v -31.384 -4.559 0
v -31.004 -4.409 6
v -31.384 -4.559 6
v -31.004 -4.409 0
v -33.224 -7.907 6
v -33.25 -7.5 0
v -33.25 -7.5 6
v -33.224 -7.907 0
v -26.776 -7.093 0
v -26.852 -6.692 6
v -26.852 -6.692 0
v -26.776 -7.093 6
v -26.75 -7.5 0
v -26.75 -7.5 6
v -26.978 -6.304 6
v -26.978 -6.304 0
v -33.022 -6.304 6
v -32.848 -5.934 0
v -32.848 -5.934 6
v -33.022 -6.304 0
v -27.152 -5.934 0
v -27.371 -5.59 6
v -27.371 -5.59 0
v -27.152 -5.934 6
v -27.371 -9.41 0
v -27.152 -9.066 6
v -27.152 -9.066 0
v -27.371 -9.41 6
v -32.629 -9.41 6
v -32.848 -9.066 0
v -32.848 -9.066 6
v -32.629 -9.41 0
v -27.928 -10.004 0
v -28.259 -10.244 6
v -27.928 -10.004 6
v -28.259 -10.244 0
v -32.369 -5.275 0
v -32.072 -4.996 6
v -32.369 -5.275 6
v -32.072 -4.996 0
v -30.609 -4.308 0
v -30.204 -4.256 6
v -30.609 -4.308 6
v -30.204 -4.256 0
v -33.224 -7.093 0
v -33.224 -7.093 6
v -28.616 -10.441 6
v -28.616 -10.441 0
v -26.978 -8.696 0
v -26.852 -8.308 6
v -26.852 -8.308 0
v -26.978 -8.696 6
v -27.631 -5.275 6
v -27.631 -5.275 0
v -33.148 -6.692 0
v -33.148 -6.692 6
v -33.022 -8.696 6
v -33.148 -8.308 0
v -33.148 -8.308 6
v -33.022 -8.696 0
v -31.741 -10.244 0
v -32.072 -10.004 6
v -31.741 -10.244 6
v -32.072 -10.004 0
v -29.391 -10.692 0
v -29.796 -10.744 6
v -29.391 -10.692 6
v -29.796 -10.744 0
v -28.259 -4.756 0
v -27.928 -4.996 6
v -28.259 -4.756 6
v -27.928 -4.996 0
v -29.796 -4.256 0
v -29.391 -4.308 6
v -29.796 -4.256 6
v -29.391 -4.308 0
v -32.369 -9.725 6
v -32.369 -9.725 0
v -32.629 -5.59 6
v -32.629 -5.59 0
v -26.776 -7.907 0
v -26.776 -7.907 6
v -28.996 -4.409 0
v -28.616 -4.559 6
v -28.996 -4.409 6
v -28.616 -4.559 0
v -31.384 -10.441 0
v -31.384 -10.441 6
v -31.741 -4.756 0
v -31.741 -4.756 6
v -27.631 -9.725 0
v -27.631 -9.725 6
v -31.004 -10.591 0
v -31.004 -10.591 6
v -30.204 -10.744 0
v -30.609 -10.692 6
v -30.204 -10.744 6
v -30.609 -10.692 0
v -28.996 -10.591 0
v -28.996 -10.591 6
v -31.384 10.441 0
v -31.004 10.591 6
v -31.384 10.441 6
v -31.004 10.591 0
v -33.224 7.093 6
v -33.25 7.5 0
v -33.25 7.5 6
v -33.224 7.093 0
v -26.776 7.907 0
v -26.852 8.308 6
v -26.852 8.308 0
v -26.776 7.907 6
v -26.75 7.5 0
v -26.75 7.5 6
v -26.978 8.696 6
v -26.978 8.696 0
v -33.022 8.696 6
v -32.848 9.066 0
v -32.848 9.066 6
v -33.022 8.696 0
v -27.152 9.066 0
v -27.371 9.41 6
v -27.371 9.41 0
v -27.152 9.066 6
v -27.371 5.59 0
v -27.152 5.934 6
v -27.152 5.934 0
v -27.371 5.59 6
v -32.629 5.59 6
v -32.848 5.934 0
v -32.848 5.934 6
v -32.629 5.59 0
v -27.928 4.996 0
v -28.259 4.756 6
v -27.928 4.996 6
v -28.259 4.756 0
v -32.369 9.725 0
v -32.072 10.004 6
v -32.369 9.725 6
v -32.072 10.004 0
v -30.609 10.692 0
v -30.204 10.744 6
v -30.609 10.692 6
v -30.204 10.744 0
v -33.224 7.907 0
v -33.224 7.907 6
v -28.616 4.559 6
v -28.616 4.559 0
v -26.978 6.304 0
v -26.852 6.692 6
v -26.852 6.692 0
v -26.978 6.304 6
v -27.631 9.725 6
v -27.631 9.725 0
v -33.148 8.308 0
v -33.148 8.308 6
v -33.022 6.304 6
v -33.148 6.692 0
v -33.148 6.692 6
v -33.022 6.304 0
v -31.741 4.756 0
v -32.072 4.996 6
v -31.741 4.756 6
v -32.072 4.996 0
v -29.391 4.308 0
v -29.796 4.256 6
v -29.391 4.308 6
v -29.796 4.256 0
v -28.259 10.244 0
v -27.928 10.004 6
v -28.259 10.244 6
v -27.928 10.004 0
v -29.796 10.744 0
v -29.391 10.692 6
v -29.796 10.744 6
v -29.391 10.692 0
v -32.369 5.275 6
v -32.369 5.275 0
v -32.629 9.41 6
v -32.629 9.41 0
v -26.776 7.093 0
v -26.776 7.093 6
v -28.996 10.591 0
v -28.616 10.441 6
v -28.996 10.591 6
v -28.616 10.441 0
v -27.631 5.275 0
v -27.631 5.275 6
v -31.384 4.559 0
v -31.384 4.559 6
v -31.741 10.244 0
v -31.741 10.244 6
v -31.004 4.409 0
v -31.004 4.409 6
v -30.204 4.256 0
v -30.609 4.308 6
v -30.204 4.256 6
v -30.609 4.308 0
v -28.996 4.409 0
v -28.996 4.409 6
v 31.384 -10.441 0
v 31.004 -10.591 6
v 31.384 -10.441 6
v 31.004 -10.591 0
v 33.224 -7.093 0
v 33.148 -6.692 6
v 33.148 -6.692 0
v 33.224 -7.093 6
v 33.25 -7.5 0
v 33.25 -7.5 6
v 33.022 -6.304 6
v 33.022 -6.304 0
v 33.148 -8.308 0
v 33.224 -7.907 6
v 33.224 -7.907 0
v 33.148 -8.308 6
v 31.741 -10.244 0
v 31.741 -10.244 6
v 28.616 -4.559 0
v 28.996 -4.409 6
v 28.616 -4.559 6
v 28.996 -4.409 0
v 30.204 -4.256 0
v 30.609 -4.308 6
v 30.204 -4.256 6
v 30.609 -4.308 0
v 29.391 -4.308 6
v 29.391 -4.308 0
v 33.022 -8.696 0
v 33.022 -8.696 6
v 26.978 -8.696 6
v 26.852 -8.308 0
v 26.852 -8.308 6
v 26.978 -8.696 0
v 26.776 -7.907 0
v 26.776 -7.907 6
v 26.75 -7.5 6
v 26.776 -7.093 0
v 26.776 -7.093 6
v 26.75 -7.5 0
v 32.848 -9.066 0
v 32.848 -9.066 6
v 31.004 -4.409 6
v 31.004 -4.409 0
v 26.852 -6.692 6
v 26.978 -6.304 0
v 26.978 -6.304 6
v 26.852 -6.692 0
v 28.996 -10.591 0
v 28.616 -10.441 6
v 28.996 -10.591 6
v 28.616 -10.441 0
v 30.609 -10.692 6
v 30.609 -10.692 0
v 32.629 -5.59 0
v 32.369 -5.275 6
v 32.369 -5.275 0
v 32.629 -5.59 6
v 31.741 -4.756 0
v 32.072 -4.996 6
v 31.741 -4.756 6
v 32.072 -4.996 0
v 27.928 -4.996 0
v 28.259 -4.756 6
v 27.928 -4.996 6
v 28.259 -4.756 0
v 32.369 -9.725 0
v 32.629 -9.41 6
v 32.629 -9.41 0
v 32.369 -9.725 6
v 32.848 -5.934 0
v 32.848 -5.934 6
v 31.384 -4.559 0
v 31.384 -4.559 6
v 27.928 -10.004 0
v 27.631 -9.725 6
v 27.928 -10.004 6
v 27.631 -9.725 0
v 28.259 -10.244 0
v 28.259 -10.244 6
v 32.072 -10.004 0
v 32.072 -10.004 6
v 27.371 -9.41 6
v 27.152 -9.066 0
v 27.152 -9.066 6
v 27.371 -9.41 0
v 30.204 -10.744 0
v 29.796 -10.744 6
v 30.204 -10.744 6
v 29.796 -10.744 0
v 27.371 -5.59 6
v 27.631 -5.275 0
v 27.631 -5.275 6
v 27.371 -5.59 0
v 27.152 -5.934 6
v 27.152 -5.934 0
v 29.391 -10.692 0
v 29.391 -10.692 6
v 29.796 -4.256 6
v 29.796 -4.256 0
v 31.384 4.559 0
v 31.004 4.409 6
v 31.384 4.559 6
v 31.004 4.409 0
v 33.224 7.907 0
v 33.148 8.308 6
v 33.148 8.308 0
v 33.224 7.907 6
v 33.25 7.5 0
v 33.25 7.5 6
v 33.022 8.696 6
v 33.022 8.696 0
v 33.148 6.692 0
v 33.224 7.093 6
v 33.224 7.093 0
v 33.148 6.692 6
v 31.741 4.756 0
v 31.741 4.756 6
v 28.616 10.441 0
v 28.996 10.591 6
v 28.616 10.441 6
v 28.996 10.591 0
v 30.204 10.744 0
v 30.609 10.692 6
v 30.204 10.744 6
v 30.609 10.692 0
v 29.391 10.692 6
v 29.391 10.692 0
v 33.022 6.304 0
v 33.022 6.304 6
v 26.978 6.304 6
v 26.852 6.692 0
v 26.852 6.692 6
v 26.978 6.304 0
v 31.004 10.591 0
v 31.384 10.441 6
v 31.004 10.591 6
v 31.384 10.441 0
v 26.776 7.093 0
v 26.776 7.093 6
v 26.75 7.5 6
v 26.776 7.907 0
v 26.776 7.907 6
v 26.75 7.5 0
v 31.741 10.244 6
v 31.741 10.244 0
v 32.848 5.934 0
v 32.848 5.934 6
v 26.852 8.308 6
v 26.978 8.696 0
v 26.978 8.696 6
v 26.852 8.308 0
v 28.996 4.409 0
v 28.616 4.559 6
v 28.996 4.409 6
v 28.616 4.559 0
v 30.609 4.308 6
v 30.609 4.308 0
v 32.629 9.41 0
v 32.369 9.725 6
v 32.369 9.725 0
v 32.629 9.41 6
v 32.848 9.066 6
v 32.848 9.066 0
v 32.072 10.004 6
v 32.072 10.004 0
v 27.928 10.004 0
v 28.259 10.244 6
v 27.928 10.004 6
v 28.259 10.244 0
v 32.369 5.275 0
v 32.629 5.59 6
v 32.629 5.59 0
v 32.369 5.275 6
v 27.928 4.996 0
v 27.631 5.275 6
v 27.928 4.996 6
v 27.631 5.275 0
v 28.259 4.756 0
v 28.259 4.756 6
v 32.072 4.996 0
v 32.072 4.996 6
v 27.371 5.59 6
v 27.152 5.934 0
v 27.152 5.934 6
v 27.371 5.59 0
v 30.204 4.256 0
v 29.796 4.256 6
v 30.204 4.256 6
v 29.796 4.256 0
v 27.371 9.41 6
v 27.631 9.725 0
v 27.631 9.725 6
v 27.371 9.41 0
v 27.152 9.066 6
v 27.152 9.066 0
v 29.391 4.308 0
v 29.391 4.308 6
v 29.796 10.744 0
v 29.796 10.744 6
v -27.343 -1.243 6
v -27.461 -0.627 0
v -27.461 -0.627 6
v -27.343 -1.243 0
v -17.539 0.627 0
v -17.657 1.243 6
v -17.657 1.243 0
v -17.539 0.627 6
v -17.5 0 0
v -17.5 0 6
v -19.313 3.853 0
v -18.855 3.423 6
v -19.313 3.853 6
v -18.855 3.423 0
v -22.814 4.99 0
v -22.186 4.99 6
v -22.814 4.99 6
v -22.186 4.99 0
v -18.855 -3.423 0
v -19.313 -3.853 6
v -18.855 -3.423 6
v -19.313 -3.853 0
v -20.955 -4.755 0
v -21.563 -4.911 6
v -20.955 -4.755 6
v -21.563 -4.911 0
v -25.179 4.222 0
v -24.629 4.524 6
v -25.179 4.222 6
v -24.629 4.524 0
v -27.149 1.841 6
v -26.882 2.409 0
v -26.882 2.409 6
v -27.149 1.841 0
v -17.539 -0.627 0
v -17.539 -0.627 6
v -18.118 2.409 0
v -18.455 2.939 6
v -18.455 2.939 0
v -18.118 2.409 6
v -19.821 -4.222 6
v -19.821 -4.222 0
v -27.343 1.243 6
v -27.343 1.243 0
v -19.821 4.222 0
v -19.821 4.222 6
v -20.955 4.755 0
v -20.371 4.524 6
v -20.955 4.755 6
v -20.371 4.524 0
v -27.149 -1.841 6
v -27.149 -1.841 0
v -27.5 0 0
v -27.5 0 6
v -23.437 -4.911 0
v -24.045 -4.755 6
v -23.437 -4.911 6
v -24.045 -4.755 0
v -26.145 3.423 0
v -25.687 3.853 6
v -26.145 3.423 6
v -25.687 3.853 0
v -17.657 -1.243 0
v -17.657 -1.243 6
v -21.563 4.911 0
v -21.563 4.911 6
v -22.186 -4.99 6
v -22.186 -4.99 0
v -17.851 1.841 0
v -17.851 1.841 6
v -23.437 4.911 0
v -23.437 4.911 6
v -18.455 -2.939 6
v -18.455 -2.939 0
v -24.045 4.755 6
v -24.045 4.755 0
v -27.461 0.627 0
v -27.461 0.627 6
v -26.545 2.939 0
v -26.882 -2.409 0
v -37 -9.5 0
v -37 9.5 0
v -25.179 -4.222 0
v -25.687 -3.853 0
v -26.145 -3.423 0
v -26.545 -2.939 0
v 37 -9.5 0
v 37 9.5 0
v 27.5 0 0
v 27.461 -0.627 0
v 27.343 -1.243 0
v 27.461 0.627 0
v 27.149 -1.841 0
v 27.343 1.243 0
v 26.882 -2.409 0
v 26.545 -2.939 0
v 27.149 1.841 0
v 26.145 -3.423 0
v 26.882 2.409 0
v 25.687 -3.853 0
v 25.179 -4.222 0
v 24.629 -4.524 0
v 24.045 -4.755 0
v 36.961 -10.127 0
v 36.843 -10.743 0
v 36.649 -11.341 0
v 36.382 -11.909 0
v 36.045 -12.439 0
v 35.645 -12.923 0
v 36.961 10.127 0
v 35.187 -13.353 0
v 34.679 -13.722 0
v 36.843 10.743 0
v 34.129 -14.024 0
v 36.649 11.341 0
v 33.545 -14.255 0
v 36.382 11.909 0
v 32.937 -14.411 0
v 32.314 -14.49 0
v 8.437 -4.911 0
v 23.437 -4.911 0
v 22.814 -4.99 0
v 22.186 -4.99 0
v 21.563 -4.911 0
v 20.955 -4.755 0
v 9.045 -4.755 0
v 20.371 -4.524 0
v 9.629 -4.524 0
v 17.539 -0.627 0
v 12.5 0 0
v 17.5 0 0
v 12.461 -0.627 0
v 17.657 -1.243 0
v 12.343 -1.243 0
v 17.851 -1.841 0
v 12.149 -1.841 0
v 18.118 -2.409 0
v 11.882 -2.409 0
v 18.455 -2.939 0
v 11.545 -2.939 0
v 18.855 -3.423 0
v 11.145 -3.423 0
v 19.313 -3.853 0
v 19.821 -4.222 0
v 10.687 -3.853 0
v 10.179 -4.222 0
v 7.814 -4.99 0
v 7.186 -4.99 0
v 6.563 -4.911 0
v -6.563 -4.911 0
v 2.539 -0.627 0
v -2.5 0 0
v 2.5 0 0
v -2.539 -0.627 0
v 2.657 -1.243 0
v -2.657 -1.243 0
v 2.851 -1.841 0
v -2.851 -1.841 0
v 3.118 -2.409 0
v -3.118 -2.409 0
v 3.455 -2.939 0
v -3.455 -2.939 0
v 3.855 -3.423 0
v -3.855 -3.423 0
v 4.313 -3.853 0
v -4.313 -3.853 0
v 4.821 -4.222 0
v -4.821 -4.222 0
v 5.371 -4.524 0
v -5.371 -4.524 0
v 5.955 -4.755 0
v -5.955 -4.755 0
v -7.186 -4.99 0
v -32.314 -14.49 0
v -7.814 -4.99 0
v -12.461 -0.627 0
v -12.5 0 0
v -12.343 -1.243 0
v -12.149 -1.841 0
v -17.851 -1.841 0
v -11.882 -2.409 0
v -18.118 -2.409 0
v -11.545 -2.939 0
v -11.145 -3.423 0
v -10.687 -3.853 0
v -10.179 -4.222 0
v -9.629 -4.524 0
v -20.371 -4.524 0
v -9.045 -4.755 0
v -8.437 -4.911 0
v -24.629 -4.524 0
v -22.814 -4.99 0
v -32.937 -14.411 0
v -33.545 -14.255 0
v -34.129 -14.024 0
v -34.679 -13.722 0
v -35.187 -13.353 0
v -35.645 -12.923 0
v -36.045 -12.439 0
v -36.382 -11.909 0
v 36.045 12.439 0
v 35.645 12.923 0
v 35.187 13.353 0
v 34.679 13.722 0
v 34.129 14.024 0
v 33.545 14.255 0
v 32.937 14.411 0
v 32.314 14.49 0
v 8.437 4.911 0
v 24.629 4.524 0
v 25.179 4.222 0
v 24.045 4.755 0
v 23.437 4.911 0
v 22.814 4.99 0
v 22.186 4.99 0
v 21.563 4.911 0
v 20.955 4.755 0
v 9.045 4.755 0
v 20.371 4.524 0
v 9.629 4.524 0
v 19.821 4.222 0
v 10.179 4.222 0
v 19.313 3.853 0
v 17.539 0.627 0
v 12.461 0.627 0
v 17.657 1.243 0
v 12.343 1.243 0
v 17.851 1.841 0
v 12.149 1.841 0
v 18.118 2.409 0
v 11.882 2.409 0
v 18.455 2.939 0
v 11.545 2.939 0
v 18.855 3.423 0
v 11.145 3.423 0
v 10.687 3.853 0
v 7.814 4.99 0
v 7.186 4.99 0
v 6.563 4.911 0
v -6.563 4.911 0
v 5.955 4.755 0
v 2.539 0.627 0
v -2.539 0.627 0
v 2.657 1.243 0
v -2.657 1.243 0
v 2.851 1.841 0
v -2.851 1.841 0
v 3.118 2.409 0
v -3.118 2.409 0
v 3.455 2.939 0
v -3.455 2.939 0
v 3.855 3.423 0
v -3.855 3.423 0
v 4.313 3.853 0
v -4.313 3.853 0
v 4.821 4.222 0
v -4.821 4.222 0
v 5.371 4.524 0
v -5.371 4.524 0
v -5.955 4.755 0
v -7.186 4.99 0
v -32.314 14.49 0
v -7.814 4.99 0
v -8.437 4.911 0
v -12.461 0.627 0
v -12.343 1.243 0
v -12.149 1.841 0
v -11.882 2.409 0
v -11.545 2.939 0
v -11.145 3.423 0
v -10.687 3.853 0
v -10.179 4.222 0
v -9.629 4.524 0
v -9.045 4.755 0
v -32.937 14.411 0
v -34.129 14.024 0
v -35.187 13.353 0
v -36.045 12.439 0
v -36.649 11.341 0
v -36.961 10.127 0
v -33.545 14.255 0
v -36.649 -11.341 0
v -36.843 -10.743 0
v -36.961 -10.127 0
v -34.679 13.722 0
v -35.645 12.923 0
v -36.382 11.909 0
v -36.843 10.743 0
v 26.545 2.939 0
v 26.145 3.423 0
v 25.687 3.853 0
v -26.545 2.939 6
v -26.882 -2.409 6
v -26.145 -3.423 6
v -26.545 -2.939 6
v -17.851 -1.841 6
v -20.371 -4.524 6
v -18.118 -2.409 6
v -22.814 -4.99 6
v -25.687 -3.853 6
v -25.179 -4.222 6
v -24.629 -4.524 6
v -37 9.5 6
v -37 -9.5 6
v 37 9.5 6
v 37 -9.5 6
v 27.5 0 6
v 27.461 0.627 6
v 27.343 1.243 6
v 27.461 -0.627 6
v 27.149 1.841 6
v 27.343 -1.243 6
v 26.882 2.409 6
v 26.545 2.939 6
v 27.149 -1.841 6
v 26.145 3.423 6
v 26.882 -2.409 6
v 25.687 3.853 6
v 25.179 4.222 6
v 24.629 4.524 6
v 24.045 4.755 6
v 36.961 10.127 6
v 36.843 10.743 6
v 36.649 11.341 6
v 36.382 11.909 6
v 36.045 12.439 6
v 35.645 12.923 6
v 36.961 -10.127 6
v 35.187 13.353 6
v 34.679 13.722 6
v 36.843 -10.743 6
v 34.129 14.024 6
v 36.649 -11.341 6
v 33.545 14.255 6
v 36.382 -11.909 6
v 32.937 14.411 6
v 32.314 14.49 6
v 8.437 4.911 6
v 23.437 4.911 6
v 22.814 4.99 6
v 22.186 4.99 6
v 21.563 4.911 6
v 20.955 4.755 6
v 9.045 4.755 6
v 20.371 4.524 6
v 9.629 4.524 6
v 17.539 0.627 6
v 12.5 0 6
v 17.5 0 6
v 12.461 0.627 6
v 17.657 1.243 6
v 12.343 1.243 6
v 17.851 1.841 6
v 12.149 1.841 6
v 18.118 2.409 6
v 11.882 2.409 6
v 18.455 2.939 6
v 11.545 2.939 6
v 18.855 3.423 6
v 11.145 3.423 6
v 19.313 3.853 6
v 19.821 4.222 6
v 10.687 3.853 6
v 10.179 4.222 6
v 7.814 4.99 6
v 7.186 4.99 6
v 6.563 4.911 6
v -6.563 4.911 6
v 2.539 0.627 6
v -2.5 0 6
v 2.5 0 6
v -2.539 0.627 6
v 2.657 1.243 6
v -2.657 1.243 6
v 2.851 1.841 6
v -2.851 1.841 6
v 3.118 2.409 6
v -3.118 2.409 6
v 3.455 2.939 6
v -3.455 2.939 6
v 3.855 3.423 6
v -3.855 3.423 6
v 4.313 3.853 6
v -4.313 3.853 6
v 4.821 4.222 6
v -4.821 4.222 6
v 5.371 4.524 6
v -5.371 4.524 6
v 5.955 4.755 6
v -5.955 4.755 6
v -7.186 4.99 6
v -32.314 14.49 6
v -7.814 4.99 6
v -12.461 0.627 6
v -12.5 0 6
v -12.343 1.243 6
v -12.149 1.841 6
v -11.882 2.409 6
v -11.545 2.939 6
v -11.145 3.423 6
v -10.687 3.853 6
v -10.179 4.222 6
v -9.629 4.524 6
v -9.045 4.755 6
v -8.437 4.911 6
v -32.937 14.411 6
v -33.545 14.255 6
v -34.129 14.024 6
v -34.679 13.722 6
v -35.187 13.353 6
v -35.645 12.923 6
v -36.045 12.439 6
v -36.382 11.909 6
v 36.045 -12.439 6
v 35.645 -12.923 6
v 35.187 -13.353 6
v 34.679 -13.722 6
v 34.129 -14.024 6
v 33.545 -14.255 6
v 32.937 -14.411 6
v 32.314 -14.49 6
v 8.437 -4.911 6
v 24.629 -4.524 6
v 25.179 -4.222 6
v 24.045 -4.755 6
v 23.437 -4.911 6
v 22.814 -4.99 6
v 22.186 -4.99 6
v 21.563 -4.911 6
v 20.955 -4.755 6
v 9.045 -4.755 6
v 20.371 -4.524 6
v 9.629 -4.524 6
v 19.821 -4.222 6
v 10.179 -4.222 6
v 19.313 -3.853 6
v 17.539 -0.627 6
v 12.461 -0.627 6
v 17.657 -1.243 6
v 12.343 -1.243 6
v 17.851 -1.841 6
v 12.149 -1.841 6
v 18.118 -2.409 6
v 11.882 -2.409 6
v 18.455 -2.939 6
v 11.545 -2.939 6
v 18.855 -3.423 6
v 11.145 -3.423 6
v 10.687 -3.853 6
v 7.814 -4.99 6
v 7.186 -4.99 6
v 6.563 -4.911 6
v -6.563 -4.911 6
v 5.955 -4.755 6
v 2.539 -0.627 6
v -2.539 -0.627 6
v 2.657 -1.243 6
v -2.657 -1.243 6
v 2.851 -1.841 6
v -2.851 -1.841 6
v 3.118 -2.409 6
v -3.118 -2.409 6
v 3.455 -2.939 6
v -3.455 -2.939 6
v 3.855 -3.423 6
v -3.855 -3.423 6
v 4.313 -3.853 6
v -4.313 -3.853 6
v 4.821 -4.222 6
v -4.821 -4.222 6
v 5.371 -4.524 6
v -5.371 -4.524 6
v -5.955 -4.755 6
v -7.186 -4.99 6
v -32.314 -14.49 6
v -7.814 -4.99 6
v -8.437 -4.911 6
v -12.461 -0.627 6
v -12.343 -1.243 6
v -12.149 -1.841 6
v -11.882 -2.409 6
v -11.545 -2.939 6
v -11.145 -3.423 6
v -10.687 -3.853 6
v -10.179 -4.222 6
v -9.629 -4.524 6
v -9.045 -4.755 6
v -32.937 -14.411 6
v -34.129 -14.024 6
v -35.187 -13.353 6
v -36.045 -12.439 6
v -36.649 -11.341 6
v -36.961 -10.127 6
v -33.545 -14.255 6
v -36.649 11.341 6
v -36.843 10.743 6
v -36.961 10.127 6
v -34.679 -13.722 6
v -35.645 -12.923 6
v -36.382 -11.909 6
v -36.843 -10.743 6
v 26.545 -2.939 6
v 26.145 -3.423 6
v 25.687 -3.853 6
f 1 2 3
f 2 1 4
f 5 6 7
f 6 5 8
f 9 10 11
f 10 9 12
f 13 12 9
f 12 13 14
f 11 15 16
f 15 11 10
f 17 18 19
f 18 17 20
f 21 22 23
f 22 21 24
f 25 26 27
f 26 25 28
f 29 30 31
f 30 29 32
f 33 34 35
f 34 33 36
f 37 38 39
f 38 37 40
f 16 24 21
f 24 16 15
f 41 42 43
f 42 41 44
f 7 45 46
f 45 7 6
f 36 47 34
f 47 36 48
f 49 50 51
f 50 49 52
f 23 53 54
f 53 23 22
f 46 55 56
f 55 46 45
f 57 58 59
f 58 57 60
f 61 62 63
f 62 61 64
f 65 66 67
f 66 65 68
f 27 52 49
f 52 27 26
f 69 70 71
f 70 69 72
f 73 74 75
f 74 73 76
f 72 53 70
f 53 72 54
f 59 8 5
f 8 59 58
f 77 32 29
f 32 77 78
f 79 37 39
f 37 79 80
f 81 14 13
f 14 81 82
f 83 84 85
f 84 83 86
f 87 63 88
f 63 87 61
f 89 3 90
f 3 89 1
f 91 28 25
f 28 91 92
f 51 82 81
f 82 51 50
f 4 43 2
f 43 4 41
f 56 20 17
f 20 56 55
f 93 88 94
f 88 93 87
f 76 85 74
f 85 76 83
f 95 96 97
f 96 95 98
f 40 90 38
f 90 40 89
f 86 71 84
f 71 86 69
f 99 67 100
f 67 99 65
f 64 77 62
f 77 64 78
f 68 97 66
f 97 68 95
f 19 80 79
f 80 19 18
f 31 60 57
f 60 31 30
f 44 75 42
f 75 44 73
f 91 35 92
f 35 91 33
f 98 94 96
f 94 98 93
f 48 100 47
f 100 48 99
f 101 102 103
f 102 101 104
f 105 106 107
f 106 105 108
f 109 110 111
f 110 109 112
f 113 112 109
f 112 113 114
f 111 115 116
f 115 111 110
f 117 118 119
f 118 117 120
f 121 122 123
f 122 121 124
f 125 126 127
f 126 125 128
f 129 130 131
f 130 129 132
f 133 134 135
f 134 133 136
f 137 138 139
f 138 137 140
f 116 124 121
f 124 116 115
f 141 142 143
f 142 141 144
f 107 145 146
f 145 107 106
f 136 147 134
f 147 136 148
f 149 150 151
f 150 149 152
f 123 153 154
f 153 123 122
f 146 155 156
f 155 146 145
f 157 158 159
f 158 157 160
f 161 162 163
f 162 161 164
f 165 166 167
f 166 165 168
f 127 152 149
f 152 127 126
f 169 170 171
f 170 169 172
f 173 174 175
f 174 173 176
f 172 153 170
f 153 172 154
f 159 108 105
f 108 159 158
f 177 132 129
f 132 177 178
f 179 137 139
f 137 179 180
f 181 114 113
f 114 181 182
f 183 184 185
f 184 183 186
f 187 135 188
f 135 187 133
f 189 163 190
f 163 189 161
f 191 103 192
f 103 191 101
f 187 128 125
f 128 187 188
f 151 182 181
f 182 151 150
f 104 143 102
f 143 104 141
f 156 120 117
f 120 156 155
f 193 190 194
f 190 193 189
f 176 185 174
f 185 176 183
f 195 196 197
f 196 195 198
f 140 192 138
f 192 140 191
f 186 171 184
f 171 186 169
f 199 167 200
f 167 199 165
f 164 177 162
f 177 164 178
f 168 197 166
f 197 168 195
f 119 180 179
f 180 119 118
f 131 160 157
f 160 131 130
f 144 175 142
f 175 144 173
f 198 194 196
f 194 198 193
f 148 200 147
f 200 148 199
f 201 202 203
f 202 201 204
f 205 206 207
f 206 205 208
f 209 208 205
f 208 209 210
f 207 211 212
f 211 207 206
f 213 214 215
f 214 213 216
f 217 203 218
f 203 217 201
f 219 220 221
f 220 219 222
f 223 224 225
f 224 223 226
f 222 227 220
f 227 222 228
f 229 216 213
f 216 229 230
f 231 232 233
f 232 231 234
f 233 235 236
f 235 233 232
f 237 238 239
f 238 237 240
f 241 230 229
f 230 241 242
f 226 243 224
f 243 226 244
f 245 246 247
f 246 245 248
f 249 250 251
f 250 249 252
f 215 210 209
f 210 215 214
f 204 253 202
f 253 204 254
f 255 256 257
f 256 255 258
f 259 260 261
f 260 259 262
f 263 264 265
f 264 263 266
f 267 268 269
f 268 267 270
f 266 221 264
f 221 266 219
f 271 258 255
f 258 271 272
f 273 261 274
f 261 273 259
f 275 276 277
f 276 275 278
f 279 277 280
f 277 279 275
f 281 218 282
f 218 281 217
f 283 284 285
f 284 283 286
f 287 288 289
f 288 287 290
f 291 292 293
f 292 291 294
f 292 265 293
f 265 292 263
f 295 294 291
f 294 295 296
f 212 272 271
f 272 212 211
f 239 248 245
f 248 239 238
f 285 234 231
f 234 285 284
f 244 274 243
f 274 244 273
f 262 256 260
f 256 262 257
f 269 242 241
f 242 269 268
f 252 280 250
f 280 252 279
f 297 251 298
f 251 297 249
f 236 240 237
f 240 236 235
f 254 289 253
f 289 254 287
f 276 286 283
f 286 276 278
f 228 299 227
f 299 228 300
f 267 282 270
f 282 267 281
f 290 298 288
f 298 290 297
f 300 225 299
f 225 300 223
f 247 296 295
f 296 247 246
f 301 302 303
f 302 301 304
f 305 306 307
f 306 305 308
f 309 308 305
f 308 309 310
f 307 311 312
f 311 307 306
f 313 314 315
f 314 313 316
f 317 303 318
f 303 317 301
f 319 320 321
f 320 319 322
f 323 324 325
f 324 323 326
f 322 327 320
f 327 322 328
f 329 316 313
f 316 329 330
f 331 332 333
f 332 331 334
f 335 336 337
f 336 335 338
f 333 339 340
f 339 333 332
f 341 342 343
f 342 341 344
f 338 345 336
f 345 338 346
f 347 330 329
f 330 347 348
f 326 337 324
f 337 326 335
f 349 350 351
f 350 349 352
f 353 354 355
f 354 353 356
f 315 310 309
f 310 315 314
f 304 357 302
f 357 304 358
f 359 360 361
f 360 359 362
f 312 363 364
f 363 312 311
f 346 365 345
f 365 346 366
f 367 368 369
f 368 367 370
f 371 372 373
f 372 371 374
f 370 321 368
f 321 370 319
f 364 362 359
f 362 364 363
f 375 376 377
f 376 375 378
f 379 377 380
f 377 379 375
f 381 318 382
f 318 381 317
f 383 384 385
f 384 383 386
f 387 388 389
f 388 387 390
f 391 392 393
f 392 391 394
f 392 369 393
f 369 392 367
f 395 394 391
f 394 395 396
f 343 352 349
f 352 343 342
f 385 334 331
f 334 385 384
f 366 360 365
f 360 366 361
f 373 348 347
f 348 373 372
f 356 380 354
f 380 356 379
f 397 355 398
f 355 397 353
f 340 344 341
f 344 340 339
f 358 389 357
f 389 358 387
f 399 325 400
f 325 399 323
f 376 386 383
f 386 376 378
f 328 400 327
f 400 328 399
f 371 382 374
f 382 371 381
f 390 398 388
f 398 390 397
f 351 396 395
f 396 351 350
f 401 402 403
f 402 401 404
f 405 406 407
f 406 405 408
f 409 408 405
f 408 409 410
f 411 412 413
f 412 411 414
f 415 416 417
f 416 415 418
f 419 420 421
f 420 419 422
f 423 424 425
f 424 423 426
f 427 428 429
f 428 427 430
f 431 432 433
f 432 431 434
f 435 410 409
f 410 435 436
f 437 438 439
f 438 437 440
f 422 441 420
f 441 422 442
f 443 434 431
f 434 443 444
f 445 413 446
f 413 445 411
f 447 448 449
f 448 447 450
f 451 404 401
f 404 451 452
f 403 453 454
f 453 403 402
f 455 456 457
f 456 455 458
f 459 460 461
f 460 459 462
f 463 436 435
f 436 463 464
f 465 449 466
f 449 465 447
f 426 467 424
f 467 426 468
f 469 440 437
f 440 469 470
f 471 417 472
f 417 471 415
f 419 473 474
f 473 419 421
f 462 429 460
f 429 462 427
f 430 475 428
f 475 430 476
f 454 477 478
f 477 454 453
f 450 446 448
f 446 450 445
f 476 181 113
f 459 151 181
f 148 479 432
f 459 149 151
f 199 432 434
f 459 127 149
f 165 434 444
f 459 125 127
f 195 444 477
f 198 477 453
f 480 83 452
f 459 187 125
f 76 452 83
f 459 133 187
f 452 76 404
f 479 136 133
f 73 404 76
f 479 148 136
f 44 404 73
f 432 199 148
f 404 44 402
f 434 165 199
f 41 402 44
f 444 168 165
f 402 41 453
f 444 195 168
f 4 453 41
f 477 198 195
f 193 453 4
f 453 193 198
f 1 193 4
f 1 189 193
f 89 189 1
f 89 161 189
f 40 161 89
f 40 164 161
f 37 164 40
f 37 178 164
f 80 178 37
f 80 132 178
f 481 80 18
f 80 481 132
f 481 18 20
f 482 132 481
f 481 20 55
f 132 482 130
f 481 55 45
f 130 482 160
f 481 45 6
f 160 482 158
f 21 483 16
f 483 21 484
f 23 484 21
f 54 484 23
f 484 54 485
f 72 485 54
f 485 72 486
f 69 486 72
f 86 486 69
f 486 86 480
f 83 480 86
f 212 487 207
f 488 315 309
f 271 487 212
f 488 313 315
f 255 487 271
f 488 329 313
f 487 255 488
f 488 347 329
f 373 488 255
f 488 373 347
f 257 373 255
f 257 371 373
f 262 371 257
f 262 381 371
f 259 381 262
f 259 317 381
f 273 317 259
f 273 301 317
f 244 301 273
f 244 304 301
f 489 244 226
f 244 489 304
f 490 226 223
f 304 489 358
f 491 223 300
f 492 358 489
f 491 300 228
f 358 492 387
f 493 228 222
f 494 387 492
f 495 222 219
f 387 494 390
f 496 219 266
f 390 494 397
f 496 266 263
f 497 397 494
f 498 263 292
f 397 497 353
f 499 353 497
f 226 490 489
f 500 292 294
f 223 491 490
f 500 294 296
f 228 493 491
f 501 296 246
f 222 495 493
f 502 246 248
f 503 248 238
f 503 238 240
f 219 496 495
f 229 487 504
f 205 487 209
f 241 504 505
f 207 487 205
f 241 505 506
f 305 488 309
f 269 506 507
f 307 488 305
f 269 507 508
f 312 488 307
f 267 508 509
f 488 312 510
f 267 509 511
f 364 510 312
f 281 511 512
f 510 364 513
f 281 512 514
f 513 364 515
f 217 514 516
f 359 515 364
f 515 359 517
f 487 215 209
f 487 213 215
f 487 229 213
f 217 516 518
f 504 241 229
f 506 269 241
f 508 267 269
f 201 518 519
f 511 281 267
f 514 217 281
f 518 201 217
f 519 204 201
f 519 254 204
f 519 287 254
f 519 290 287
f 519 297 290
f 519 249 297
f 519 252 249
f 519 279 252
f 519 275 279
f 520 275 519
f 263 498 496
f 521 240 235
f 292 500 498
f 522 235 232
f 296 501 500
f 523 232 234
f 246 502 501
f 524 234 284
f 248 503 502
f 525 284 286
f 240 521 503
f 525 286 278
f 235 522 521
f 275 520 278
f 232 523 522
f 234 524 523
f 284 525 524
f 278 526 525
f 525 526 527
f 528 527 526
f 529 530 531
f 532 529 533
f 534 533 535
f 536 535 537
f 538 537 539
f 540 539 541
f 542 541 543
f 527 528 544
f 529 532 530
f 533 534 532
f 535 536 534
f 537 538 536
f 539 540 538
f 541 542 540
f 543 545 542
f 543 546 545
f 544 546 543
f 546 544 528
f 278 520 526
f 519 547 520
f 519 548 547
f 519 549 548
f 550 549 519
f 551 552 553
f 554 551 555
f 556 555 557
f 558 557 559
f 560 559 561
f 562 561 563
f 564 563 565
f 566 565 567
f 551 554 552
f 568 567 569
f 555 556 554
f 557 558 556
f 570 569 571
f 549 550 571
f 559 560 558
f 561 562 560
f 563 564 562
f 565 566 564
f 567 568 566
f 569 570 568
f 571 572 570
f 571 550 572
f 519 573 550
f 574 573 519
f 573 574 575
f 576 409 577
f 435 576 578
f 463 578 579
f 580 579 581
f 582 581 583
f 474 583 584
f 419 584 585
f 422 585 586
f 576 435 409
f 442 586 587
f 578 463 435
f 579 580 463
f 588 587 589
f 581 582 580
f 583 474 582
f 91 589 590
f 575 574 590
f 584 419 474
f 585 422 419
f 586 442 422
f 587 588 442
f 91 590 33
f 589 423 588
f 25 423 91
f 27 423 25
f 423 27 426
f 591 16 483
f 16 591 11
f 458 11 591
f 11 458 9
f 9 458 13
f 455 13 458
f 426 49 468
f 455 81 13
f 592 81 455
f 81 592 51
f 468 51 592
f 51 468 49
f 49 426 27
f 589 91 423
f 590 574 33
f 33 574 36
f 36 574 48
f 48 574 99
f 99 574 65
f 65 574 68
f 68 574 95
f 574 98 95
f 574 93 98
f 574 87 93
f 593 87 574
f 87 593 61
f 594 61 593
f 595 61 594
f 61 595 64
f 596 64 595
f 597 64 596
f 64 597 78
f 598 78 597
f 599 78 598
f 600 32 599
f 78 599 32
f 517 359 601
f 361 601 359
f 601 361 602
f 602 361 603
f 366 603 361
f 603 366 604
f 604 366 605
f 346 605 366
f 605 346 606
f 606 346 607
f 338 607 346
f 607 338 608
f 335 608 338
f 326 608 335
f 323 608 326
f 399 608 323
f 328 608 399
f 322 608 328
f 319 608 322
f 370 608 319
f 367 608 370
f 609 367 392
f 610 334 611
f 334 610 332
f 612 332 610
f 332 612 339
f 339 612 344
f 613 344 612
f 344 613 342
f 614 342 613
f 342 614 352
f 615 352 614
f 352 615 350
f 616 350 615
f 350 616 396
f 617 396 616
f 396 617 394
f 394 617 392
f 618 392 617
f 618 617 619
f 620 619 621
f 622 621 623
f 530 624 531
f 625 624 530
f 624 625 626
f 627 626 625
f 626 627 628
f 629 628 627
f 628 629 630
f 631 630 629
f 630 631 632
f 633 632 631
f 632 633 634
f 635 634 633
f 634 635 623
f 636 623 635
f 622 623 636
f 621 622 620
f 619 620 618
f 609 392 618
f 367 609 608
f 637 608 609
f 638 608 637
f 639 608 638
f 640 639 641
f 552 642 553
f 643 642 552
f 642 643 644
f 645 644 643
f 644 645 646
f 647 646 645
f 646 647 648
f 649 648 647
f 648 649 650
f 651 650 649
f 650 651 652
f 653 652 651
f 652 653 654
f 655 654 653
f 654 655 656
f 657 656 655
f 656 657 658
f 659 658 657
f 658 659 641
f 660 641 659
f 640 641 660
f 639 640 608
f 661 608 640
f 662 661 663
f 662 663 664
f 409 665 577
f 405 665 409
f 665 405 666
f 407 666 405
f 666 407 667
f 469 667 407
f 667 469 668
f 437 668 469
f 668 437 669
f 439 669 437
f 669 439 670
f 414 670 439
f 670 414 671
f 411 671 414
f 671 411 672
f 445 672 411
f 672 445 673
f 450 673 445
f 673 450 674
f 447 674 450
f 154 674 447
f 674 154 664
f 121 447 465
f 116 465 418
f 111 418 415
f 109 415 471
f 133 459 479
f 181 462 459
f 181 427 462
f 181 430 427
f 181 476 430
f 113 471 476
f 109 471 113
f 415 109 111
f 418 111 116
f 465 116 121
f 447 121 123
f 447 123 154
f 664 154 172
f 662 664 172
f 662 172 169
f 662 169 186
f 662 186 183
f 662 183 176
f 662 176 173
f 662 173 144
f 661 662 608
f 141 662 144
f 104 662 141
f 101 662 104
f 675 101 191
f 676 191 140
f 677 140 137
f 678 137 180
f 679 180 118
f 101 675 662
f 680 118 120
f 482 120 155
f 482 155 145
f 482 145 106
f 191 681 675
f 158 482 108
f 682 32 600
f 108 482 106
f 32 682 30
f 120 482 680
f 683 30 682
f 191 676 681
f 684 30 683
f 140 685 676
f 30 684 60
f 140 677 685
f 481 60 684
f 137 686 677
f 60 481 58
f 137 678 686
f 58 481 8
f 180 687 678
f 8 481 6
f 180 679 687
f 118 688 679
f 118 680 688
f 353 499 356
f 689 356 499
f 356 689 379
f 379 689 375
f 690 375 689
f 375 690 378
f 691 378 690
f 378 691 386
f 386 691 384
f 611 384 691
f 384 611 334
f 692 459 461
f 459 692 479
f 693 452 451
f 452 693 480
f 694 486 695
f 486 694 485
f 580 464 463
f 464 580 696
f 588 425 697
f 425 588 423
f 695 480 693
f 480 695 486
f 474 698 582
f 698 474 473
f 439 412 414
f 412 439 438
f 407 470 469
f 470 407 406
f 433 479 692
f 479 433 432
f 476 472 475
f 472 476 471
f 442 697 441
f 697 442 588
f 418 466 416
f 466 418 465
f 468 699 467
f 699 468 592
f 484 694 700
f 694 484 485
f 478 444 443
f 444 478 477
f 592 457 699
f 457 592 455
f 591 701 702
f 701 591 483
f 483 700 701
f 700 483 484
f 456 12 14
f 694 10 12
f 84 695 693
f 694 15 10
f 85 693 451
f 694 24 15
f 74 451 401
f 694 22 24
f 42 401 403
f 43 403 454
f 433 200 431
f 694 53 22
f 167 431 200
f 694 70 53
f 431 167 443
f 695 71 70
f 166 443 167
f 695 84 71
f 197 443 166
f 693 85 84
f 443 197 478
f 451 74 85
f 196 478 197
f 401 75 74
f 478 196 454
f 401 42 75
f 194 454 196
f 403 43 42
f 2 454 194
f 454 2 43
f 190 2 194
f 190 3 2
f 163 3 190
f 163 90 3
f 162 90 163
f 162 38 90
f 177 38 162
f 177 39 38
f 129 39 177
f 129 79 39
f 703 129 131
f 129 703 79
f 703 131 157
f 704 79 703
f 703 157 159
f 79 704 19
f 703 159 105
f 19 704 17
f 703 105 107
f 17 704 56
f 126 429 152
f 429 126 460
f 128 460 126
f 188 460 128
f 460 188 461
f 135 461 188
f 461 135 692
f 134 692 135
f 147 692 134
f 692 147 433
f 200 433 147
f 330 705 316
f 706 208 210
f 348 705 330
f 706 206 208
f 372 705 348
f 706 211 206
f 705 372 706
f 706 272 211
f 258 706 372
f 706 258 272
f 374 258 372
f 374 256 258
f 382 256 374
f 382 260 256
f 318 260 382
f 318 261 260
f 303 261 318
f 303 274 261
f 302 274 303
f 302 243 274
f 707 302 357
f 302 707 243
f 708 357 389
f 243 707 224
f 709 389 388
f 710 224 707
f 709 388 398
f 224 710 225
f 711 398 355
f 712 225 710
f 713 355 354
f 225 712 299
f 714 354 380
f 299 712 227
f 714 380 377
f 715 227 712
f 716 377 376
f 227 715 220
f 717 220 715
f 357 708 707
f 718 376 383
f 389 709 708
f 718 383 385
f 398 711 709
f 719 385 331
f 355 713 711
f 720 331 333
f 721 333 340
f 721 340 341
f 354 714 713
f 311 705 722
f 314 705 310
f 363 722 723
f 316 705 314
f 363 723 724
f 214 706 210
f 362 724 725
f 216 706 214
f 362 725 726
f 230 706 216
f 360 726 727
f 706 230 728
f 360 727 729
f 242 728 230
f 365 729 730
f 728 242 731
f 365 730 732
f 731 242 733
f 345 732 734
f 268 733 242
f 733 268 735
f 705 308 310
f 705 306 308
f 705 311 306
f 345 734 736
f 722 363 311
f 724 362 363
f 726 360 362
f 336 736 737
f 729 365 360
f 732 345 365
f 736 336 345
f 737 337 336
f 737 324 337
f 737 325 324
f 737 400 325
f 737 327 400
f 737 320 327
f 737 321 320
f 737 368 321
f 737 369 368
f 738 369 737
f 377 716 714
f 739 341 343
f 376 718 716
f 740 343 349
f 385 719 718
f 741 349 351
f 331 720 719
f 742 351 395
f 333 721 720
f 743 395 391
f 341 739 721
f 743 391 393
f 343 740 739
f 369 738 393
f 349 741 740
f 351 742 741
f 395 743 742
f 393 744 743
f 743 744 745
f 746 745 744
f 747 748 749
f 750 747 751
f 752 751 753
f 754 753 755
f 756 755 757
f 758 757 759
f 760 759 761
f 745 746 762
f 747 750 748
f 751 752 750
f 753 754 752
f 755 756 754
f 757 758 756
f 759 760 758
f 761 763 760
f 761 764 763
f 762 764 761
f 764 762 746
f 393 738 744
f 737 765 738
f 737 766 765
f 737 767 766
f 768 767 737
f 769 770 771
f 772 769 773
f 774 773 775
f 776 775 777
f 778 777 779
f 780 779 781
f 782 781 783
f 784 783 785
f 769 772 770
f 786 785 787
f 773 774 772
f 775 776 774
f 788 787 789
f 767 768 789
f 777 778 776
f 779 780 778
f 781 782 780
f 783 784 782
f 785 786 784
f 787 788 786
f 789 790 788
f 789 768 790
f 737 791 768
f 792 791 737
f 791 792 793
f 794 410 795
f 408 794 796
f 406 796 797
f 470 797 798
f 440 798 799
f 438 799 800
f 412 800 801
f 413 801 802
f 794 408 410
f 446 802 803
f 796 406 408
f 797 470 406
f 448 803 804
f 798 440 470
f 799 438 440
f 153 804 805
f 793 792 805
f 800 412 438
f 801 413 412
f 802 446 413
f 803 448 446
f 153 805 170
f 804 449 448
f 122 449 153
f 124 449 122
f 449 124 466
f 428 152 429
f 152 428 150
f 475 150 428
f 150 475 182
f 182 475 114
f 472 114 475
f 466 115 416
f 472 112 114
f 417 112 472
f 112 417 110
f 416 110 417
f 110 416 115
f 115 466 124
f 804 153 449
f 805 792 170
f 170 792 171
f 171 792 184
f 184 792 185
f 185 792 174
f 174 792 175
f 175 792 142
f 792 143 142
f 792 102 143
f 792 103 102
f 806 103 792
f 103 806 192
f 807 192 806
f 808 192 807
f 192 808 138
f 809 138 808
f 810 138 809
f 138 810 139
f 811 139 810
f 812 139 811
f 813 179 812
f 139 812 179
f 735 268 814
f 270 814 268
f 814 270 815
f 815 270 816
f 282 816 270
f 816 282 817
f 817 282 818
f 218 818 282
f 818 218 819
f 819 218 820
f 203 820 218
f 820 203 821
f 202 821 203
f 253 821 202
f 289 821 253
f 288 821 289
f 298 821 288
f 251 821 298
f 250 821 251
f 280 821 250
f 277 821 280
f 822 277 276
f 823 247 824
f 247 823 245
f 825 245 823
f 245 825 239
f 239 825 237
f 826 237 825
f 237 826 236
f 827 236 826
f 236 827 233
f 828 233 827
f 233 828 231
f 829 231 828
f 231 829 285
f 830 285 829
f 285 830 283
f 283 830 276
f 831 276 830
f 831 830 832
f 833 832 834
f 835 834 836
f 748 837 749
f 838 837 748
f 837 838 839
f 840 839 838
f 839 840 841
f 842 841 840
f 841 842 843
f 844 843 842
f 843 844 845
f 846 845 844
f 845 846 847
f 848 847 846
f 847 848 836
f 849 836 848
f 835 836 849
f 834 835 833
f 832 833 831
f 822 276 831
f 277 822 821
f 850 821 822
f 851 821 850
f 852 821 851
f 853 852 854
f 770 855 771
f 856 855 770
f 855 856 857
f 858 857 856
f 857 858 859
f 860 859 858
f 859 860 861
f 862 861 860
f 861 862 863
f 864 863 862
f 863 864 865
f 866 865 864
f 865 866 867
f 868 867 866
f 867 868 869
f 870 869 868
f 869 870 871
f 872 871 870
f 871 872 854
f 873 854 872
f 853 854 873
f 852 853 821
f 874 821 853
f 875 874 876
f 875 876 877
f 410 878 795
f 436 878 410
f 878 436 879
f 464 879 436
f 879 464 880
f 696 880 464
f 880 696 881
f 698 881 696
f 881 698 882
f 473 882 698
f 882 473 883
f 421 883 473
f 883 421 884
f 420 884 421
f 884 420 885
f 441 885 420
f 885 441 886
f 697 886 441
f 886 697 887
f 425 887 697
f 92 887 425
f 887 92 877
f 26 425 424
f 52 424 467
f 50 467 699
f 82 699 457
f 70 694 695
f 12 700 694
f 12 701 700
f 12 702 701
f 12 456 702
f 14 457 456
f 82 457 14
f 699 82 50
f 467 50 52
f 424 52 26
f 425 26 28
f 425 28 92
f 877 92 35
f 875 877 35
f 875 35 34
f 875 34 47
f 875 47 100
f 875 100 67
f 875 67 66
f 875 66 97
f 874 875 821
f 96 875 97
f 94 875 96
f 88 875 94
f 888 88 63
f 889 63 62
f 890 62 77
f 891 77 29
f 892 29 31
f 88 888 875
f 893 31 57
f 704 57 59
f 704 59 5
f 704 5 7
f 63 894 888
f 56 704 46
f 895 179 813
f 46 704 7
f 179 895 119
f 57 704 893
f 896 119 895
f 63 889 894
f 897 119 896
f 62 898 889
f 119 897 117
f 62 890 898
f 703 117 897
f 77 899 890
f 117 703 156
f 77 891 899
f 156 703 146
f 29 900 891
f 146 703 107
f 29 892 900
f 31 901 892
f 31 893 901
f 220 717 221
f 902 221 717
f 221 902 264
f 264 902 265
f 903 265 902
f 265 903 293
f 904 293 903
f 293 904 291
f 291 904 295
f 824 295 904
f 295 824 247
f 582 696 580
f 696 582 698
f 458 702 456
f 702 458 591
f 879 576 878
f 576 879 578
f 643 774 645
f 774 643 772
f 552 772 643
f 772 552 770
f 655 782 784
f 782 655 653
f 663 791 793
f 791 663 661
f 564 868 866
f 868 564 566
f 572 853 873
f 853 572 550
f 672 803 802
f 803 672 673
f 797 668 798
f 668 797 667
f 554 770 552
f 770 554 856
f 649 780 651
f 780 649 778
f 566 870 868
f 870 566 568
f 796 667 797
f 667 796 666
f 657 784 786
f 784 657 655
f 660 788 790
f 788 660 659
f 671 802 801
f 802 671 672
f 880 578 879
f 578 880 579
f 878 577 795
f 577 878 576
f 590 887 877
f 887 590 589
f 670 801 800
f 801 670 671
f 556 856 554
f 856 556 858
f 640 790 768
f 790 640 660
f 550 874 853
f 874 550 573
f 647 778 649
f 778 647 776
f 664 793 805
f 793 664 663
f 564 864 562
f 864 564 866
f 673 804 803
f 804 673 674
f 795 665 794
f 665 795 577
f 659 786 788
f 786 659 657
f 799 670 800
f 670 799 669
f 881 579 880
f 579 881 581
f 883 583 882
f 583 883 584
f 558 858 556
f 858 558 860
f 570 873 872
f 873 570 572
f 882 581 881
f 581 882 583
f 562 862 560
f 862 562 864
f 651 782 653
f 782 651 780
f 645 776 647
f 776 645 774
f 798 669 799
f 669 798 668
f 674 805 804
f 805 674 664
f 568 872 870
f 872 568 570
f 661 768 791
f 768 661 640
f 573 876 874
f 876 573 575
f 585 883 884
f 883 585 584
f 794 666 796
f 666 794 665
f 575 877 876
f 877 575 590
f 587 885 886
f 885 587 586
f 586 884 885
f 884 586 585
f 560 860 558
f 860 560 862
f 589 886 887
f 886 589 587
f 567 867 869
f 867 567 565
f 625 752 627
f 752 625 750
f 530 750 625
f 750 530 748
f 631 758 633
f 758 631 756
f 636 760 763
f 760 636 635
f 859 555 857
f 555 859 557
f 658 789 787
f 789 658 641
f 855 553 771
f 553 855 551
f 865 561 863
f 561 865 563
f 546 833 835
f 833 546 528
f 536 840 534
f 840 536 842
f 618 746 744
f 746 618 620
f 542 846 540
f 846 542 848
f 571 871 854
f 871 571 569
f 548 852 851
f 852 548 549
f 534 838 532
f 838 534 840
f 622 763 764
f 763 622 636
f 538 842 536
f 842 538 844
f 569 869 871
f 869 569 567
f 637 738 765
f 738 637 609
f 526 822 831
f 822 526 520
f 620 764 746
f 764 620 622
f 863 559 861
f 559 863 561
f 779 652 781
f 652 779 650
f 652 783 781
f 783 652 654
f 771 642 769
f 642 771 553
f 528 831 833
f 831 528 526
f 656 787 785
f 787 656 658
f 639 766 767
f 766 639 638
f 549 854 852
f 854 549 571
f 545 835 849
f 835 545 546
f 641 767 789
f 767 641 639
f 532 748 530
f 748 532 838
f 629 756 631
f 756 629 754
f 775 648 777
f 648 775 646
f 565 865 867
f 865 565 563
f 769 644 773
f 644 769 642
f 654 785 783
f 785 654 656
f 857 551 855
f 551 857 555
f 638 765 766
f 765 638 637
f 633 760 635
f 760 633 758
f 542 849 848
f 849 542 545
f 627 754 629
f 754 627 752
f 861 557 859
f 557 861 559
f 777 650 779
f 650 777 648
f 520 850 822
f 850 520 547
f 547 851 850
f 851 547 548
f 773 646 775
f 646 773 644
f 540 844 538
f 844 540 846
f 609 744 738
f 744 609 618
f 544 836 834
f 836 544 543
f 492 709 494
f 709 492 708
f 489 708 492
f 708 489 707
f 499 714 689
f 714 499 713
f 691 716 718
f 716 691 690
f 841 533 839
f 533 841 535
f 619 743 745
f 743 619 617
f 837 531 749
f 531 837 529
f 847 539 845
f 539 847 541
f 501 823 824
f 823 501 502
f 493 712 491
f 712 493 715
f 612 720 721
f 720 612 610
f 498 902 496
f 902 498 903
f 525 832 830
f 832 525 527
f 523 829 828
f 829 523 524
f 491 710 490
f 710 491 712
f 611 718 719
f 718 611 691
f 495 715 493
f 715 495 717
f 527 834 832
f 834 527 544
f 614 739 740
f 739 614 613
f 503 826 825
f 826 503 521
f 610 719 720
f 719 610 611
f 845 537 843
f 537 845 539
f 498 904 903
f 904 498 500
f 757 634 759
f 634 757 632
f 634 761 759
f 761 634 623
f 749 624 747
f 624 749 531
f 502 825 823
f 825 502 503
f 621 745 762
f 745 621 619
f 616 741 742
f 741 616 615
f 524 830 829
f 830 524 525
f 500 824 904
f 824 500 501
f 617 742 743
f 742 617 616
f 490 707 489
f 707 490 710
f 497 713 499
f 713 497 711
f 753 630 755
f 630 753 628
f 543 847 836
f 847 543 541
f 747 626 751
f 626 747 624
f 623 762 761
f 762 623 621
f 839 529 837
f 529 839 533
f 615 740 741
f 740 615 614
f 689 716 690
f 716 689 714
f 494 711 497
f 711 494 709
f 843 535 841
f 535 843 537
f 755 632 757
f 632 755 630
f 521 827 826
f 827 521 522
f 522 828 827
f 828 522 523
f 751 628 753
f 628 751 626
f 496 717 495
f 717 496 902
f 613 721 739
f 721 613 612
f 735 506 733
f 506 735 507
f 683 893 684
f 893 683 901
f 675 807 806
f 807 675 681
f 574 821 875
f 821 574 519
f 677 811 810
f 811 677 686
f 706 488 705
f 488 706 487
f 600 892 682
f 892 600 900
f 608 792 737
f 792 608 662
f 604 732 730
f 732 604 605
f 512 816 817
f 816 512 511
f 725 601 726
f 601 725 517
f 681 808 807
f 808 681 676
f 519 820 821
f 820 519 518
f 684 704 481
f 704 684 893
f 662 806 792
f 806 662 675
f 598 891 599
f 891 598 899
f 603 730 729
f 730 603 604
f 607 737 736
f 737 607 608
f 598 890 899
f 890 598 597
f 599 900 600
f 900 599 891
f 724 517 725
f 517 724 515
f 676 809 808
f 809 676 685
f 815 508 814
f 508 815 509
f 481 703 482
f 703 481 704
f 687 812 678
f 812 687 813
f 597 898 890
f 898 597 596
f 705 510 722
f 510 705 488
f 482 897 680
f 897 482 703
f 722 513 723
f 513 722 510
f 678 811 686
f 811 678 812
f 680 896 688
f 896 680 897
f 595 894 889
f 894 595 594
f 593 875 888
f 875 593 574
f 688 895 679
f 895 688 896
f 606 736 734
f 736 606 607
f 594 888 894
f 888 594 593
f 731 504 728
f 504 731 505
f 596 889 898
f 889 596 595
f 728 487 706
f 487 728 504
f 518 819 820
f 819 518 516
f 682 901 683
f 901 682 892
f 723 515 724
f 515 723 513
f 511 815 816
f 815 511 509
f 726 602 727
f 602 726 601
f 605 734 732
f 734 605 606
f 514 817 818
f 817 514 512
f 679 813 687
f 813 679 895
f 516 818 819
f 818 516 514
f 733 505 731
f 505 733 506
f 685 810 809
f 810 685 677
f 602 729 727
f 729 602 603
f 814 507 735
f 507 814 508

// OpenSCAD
$fn = 50;

difference() {
	union() {
		hull() {
			translate(v = [-32.0, 9.5, 0]) {
				cylinder(h = 6, r = 5);
			}
			translate(v = [32.0, 9.5, 0]) {
				cylinder(h = 6, r = 5);
			}
			translate(v = [-32.0, -9.5, 0]) {
				cylinder(h = 6, r = 5);
			}
			translate(v = [32.0, -9.5, 0]) {
				cylinder(h = 6, r = 5);
			}
		}
	}
	union() {
		translate(v = [-30.0, -7.5, -100.0]) {
			cylinder(h = 200, r = 3.25);
		}
		translate(v = [-30.0, 7.5, -100.0]) {
			cylinder(h = 200, r = 3.25);
		}
		translate(v = [30.0, -7.5, -100.0]) {
			cylinder(h = 200, r = 3.25);
		}
		translate(v = [30.0, 7.5, -100.0]) {
			cylinder(h = 200, r = 3.25);
		}
		translate(v = [-30.0, -7.5, -100.0]) {
			cylinder(h = 200, r = 1.8);
		}
		translate(v = [-30.0, 7.5, -100.0]) {
			cylinder(h = 200, r = 1.8);
		}
		translate(v = [30.0, -7.5, -100.0]) {
			cylinder(h = 200, r = 1.8);
		}
		translate(v = [30.0, 7.5, -100.0]) {
			cylinder(h = 200, r = 1.8);
		}
		translate(v = [-22.5, 0, 0.0]) {
			cylinder(h = 6, r = 5.0);
		}
		translate(v = [-7.5, 0, 0.0]) {
			cylinder(h = 6, r = 5.0);
		}
		translate(v = [7.5, 0, 0.0]) {
			cylinder(h = 6, r = 5.0);
		}
		translate(v = [22.5, 0, 0.0]) {
			cylinder(h = 6, r = 5.0);
		}
	}
}
